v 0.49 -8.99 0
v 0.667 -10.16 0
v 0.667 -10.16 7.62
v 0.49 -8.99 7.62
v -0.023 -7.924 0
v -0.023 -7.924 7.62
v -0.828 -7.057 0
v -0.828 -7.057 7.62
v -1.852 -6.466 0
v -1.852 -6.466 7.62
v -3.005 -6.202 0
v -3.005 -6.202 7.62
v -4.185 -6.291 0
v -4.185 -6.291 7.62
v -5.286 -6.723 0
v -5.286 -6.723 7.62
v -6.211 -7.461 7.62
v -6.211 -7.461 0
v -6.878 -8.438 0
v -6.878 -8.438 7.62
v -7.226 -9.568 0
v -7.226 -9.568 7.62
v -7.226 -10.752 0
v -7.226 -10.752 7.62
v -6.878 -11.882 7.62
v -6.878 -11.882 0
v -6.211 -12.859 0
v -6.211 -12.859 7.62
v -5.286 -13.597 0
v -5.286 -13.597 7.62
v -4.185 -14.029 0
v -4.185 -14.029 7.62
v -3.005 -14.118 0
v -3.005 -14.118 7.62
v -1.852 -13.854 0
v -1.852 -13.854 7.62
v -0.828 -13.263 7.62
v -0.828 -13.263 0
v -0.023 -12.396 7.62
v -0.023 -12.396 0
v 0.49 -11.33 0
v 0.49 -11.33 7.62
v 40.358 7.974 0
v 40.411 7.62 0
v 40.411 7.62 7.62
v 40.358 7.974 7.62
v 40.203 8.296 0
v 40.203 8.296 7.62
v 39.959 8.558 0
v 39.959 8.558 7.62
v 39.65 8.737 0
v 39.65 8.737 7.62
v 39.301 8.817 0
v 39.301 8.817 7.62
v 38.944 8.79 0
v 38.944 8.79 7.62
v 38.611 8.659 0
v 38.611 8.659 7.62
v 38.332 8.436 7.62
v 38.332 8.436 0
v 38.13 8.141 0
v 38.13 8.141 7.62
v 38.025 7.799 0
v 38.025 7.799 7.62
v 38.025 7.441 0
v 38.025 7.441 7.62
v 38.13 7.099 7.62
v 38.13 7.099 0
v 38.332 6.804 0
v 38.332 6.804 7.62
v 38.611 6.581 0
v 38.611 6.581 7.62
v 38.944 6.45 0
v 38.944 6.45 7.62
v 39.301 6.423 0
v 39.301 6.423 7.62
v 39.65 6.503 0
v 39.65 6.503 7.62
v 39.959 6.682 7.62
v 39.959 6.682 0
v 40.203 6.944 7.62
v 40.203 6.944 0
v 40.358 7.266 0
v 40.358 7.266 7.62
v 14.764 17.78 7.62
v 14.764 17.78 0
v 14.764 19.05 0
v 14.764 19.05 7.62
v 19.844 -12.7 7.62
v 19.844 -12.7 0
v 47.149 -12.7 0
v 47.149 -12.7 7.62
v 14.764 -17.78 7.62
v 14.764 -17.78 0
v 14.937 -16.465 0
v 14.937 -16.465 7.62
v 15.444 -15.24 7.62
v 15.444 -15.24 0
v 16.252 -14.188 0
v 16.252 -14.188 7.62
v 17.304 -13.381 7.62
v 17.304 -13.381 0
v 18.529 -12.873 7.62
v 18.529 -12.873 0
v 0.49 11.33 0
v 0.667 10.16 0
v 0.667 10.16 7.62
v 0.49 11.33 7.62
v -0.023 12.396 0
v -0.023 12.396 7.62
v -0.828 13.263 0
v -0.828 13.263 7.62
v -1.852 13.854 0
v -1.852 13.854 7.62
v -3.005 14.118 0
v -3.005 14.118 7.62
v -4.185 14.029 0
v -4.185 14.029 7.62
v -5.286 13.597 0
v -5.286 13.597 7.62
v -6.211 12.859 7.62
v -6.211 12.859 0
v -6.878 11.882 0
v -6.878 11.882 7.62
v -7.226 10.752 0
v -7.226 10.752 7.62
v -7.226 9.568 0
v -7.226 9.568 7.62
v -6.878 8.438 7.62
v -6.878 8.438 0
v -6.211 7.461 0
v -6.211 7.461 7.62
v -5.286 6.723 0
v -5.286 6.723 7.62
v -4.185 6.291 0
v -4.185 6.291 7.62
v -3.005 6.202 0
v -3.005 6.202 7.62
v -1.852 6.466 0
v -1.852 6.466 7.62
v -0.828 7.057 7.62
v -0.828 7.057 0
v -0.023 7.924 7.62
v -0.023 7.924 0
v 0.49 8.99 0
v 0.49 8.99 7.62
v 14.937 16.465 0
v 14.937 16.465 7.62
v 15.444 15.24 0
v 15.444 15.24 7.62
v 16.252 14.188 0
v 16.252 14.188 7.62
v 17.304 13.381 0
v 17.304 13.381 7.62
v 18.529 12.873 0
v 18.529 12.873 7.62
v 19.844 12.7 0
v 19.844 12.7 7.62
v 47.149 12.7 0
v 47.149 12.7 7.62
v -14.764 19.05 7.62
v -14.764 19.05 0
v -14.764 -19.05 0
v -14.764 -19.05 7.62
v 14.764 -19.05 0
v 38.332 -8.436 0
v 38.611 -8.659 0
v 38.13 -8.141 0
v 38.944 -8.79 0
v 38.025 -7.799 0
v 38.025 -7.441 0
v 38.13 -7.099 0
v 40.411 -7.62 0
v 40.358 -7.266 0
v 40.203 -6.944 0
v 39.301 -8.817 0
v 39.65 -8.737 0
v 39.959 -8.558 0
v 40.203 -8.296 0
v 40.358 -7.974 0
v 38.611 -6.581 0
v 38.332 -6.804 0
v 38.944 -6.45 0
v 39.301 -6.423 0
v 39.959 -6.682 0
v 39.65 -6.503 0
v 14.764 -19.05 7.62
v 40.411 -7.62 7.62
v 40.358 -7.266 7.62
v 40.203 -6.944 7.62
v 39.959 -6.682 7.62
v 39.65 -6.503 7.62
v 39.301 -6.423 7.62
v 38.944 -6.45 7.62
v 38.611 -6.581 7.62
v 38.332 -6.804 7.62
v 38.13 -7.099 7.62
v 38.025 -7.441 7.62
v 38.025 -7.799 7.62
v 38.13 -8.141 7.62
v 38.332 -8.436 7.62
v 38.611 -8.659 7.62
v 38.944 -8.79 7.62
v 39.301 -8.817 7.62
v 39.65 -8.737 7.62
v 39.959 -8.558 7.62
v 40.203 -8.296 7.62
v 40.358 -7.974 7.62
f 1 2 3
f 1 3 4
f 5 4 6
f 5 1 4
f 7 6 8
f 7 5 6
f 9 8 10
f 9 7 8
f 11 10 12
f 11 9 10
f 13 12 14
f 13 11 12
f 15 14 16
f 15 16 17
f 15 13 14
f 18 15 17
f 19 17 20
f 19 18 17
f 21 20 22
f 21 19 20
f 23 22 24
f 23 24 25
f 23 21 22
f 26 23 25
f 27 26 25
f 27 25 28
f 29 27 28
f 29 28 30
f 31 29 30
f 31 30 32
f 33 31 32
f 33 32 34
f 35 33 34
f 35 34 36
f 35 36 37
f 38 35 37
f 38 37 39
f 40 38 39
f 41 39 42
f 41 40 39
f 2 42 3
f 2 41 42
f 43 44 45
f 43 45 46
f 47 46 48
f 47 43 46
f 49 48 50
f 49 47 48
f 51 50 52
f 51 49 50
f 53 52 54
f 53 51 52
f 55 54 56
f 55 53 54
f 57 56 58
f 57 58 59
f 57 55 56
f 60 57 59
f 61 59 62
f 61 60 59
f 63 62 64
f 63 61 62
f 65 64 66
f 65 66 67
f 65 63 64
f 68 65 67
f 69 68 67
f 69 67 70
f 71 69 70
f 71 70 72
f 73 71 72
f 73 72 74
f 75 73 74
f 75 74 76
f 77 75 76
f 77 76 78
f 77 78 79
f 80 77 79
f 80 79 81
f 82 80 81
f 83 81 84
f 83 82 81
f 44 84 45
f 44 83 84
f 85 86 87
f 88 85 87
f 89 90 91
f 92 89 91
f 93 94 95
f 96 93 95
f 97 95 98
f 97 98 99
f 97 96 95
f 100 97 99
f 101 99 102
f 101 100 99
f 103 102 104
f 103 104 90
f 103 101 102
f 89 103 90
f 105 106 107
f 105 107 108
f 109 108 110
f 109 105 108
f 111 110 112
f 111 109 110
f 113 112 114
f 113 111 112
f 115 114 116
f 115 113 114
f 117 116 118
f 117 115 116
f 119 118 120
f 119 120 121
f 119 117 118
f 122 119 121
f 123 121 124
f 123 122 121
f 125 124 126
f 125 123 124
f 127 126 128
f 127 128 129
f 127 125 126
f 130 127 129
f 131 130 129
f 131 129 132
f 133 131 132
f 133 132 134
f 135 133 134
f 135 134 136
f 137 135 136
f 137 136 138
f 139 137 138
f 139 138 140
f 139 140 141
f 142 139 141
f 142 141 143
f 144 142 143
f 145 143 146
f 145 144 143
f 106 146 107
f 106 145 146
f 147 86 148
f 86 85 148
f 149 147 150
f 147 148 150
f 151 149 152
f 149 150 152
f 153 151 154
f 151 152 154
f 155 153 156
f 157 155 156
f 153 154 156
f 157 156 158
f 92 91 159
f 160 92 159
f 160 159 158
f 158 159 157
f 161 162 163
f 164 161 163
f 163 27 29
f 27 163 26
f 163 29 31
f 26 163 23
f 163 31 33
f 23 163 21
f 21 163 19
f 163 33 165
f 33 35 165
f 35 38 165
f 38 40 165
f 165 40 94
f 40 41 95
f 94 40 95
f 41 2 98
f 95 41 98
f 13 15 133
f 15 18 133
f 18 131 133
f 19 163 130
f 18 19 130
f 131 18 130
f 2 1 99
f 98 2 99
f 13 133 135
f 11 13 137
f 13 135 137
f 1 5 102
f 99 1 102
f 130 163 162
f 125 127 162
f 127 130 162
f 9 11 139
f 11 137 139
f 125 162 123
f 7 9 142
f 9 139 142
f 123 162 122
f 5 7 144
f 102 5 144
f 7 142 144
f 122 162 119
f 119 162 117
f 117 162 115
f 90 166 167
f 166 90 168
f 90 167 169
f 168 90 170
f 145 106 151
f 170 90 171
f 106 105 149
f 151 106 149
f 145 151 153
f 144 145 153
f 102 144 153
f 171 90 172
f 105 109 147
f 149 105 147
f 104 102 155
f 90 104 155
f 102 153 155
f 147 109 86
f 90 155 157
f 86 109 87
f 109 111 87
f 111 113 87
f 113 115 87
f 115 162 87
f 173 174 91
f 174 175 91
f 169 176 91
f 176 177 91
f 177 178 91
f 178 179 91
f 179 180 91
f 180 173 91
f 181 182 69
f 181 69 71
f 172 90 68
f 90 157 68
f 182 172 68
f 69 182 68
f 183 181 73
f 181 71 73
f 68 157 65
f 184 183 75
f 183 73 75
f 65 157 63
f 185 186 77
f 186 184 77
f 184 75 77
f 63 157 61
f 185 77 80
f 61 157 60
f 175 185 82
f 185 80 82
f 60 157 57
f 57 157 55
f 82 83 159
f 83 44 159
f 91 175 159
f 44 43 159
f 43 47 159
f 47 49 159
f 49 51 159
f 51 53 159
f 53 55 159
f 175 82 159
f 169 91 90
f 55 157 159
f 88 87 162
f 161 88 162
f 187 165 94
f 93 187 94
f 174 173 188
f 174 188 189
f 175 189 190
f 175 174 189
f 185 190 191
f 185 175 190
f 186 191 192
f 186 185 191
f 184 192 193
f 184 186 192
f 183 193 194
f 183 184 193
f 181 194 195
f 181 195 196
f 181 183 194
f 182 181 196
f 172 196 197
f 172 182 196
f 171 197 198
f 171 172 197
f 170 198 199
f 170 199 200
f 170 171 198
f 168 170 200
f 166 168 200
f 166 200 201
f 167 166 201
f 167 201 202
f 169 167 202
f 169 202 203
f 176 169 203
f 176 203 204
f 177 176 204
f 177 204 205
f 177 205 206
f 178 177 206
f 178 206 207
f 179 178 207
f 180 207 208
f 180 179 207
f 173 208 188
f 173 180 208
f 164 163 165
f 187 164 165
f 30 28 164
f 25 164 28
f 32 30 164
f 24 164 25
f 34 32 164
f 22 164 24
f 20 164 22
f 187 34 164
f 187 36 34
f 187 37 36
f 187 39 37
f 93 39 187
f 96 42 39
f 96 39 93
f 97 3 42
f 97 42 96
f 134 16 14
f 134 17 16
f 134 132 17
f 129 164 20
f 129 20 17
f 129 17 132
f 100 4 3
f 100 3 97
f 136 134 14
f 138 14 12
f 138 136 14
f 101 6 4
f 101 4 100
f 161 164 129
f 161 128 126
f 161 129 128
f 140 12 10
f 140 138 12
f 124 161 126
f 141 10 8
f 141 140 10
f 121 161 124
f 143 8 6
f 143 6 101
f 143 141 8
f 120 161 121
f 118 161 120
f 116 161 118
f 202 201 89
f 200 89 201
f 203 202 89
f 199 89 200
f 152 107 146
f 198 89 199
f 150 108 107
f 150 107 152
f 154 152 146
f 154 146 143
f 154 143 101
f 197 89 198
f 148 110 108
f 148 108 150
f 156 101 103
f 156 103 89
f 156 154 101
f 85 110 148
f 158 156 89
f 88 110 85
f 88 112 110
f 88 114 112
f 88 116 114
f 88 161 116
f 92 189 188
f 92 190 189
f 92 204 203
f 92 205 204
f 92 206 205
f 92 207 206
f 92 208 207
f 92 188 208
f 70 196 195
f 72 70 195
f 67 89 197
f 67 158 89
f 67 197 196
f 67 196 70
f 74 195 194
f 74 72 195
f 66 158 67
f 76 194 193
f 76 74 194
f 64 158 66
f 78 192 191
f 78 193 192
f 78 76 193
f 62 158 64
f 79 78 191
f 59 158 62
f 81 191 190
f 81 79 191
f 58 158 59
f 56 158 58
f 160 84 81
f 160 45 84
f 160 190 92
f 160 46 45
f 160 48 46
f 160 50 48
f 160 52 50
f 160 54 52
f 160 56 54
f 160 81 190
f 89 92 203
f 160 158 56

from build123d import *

# Parameters (mm, degrees)
F0_R     = 3.96875
F0_R_2   = 1.2
F1_DEPTH = 7.62
F2_R     = 5.08


with BuildPart() as f1:
    # F0 (on Top) → F1 (new body)
    with BuildSketch(Plane.XY):
        Polygon((14.76375, 19.05), (-14.76375, 19.05), (-14.76375, 12.7), (-14.76375, -12.7), (-14.76375, -19.05), (14.76375, -19.05), (14.76375, -12.7), (47.14875, -12.7), (47.14875, 12.7), (14.76375, 12.7), align=None)
        with Locations((-3.302, -10.16)):
            Circle(F0_R, mode=Mode.SUBTRACT)
        with Locations((39.21125, -7.62)):
            Circle(F0_R_2, mode=Mode.SUBTRACT)
        with Locations((-3.302, 10.16)):
            Circle(F0_R, mode=Mode.SUBTRACT)
        with Locations((39.21125, 7.62)):
            Circle(F0_R_2, mode=Mode.SUBTRACT)
    extrude(amount=F1_DEPTH)

    # F2
    f2_edges = [f1.edges().sort_by_distance(p)[0] for p in [
        (14.76375, -12.7, 3.81),
        (14.76375, 12.7, 3.81),
    ]]
    fillet(f2_edges, radius=F2_R)


solid = f1.part
